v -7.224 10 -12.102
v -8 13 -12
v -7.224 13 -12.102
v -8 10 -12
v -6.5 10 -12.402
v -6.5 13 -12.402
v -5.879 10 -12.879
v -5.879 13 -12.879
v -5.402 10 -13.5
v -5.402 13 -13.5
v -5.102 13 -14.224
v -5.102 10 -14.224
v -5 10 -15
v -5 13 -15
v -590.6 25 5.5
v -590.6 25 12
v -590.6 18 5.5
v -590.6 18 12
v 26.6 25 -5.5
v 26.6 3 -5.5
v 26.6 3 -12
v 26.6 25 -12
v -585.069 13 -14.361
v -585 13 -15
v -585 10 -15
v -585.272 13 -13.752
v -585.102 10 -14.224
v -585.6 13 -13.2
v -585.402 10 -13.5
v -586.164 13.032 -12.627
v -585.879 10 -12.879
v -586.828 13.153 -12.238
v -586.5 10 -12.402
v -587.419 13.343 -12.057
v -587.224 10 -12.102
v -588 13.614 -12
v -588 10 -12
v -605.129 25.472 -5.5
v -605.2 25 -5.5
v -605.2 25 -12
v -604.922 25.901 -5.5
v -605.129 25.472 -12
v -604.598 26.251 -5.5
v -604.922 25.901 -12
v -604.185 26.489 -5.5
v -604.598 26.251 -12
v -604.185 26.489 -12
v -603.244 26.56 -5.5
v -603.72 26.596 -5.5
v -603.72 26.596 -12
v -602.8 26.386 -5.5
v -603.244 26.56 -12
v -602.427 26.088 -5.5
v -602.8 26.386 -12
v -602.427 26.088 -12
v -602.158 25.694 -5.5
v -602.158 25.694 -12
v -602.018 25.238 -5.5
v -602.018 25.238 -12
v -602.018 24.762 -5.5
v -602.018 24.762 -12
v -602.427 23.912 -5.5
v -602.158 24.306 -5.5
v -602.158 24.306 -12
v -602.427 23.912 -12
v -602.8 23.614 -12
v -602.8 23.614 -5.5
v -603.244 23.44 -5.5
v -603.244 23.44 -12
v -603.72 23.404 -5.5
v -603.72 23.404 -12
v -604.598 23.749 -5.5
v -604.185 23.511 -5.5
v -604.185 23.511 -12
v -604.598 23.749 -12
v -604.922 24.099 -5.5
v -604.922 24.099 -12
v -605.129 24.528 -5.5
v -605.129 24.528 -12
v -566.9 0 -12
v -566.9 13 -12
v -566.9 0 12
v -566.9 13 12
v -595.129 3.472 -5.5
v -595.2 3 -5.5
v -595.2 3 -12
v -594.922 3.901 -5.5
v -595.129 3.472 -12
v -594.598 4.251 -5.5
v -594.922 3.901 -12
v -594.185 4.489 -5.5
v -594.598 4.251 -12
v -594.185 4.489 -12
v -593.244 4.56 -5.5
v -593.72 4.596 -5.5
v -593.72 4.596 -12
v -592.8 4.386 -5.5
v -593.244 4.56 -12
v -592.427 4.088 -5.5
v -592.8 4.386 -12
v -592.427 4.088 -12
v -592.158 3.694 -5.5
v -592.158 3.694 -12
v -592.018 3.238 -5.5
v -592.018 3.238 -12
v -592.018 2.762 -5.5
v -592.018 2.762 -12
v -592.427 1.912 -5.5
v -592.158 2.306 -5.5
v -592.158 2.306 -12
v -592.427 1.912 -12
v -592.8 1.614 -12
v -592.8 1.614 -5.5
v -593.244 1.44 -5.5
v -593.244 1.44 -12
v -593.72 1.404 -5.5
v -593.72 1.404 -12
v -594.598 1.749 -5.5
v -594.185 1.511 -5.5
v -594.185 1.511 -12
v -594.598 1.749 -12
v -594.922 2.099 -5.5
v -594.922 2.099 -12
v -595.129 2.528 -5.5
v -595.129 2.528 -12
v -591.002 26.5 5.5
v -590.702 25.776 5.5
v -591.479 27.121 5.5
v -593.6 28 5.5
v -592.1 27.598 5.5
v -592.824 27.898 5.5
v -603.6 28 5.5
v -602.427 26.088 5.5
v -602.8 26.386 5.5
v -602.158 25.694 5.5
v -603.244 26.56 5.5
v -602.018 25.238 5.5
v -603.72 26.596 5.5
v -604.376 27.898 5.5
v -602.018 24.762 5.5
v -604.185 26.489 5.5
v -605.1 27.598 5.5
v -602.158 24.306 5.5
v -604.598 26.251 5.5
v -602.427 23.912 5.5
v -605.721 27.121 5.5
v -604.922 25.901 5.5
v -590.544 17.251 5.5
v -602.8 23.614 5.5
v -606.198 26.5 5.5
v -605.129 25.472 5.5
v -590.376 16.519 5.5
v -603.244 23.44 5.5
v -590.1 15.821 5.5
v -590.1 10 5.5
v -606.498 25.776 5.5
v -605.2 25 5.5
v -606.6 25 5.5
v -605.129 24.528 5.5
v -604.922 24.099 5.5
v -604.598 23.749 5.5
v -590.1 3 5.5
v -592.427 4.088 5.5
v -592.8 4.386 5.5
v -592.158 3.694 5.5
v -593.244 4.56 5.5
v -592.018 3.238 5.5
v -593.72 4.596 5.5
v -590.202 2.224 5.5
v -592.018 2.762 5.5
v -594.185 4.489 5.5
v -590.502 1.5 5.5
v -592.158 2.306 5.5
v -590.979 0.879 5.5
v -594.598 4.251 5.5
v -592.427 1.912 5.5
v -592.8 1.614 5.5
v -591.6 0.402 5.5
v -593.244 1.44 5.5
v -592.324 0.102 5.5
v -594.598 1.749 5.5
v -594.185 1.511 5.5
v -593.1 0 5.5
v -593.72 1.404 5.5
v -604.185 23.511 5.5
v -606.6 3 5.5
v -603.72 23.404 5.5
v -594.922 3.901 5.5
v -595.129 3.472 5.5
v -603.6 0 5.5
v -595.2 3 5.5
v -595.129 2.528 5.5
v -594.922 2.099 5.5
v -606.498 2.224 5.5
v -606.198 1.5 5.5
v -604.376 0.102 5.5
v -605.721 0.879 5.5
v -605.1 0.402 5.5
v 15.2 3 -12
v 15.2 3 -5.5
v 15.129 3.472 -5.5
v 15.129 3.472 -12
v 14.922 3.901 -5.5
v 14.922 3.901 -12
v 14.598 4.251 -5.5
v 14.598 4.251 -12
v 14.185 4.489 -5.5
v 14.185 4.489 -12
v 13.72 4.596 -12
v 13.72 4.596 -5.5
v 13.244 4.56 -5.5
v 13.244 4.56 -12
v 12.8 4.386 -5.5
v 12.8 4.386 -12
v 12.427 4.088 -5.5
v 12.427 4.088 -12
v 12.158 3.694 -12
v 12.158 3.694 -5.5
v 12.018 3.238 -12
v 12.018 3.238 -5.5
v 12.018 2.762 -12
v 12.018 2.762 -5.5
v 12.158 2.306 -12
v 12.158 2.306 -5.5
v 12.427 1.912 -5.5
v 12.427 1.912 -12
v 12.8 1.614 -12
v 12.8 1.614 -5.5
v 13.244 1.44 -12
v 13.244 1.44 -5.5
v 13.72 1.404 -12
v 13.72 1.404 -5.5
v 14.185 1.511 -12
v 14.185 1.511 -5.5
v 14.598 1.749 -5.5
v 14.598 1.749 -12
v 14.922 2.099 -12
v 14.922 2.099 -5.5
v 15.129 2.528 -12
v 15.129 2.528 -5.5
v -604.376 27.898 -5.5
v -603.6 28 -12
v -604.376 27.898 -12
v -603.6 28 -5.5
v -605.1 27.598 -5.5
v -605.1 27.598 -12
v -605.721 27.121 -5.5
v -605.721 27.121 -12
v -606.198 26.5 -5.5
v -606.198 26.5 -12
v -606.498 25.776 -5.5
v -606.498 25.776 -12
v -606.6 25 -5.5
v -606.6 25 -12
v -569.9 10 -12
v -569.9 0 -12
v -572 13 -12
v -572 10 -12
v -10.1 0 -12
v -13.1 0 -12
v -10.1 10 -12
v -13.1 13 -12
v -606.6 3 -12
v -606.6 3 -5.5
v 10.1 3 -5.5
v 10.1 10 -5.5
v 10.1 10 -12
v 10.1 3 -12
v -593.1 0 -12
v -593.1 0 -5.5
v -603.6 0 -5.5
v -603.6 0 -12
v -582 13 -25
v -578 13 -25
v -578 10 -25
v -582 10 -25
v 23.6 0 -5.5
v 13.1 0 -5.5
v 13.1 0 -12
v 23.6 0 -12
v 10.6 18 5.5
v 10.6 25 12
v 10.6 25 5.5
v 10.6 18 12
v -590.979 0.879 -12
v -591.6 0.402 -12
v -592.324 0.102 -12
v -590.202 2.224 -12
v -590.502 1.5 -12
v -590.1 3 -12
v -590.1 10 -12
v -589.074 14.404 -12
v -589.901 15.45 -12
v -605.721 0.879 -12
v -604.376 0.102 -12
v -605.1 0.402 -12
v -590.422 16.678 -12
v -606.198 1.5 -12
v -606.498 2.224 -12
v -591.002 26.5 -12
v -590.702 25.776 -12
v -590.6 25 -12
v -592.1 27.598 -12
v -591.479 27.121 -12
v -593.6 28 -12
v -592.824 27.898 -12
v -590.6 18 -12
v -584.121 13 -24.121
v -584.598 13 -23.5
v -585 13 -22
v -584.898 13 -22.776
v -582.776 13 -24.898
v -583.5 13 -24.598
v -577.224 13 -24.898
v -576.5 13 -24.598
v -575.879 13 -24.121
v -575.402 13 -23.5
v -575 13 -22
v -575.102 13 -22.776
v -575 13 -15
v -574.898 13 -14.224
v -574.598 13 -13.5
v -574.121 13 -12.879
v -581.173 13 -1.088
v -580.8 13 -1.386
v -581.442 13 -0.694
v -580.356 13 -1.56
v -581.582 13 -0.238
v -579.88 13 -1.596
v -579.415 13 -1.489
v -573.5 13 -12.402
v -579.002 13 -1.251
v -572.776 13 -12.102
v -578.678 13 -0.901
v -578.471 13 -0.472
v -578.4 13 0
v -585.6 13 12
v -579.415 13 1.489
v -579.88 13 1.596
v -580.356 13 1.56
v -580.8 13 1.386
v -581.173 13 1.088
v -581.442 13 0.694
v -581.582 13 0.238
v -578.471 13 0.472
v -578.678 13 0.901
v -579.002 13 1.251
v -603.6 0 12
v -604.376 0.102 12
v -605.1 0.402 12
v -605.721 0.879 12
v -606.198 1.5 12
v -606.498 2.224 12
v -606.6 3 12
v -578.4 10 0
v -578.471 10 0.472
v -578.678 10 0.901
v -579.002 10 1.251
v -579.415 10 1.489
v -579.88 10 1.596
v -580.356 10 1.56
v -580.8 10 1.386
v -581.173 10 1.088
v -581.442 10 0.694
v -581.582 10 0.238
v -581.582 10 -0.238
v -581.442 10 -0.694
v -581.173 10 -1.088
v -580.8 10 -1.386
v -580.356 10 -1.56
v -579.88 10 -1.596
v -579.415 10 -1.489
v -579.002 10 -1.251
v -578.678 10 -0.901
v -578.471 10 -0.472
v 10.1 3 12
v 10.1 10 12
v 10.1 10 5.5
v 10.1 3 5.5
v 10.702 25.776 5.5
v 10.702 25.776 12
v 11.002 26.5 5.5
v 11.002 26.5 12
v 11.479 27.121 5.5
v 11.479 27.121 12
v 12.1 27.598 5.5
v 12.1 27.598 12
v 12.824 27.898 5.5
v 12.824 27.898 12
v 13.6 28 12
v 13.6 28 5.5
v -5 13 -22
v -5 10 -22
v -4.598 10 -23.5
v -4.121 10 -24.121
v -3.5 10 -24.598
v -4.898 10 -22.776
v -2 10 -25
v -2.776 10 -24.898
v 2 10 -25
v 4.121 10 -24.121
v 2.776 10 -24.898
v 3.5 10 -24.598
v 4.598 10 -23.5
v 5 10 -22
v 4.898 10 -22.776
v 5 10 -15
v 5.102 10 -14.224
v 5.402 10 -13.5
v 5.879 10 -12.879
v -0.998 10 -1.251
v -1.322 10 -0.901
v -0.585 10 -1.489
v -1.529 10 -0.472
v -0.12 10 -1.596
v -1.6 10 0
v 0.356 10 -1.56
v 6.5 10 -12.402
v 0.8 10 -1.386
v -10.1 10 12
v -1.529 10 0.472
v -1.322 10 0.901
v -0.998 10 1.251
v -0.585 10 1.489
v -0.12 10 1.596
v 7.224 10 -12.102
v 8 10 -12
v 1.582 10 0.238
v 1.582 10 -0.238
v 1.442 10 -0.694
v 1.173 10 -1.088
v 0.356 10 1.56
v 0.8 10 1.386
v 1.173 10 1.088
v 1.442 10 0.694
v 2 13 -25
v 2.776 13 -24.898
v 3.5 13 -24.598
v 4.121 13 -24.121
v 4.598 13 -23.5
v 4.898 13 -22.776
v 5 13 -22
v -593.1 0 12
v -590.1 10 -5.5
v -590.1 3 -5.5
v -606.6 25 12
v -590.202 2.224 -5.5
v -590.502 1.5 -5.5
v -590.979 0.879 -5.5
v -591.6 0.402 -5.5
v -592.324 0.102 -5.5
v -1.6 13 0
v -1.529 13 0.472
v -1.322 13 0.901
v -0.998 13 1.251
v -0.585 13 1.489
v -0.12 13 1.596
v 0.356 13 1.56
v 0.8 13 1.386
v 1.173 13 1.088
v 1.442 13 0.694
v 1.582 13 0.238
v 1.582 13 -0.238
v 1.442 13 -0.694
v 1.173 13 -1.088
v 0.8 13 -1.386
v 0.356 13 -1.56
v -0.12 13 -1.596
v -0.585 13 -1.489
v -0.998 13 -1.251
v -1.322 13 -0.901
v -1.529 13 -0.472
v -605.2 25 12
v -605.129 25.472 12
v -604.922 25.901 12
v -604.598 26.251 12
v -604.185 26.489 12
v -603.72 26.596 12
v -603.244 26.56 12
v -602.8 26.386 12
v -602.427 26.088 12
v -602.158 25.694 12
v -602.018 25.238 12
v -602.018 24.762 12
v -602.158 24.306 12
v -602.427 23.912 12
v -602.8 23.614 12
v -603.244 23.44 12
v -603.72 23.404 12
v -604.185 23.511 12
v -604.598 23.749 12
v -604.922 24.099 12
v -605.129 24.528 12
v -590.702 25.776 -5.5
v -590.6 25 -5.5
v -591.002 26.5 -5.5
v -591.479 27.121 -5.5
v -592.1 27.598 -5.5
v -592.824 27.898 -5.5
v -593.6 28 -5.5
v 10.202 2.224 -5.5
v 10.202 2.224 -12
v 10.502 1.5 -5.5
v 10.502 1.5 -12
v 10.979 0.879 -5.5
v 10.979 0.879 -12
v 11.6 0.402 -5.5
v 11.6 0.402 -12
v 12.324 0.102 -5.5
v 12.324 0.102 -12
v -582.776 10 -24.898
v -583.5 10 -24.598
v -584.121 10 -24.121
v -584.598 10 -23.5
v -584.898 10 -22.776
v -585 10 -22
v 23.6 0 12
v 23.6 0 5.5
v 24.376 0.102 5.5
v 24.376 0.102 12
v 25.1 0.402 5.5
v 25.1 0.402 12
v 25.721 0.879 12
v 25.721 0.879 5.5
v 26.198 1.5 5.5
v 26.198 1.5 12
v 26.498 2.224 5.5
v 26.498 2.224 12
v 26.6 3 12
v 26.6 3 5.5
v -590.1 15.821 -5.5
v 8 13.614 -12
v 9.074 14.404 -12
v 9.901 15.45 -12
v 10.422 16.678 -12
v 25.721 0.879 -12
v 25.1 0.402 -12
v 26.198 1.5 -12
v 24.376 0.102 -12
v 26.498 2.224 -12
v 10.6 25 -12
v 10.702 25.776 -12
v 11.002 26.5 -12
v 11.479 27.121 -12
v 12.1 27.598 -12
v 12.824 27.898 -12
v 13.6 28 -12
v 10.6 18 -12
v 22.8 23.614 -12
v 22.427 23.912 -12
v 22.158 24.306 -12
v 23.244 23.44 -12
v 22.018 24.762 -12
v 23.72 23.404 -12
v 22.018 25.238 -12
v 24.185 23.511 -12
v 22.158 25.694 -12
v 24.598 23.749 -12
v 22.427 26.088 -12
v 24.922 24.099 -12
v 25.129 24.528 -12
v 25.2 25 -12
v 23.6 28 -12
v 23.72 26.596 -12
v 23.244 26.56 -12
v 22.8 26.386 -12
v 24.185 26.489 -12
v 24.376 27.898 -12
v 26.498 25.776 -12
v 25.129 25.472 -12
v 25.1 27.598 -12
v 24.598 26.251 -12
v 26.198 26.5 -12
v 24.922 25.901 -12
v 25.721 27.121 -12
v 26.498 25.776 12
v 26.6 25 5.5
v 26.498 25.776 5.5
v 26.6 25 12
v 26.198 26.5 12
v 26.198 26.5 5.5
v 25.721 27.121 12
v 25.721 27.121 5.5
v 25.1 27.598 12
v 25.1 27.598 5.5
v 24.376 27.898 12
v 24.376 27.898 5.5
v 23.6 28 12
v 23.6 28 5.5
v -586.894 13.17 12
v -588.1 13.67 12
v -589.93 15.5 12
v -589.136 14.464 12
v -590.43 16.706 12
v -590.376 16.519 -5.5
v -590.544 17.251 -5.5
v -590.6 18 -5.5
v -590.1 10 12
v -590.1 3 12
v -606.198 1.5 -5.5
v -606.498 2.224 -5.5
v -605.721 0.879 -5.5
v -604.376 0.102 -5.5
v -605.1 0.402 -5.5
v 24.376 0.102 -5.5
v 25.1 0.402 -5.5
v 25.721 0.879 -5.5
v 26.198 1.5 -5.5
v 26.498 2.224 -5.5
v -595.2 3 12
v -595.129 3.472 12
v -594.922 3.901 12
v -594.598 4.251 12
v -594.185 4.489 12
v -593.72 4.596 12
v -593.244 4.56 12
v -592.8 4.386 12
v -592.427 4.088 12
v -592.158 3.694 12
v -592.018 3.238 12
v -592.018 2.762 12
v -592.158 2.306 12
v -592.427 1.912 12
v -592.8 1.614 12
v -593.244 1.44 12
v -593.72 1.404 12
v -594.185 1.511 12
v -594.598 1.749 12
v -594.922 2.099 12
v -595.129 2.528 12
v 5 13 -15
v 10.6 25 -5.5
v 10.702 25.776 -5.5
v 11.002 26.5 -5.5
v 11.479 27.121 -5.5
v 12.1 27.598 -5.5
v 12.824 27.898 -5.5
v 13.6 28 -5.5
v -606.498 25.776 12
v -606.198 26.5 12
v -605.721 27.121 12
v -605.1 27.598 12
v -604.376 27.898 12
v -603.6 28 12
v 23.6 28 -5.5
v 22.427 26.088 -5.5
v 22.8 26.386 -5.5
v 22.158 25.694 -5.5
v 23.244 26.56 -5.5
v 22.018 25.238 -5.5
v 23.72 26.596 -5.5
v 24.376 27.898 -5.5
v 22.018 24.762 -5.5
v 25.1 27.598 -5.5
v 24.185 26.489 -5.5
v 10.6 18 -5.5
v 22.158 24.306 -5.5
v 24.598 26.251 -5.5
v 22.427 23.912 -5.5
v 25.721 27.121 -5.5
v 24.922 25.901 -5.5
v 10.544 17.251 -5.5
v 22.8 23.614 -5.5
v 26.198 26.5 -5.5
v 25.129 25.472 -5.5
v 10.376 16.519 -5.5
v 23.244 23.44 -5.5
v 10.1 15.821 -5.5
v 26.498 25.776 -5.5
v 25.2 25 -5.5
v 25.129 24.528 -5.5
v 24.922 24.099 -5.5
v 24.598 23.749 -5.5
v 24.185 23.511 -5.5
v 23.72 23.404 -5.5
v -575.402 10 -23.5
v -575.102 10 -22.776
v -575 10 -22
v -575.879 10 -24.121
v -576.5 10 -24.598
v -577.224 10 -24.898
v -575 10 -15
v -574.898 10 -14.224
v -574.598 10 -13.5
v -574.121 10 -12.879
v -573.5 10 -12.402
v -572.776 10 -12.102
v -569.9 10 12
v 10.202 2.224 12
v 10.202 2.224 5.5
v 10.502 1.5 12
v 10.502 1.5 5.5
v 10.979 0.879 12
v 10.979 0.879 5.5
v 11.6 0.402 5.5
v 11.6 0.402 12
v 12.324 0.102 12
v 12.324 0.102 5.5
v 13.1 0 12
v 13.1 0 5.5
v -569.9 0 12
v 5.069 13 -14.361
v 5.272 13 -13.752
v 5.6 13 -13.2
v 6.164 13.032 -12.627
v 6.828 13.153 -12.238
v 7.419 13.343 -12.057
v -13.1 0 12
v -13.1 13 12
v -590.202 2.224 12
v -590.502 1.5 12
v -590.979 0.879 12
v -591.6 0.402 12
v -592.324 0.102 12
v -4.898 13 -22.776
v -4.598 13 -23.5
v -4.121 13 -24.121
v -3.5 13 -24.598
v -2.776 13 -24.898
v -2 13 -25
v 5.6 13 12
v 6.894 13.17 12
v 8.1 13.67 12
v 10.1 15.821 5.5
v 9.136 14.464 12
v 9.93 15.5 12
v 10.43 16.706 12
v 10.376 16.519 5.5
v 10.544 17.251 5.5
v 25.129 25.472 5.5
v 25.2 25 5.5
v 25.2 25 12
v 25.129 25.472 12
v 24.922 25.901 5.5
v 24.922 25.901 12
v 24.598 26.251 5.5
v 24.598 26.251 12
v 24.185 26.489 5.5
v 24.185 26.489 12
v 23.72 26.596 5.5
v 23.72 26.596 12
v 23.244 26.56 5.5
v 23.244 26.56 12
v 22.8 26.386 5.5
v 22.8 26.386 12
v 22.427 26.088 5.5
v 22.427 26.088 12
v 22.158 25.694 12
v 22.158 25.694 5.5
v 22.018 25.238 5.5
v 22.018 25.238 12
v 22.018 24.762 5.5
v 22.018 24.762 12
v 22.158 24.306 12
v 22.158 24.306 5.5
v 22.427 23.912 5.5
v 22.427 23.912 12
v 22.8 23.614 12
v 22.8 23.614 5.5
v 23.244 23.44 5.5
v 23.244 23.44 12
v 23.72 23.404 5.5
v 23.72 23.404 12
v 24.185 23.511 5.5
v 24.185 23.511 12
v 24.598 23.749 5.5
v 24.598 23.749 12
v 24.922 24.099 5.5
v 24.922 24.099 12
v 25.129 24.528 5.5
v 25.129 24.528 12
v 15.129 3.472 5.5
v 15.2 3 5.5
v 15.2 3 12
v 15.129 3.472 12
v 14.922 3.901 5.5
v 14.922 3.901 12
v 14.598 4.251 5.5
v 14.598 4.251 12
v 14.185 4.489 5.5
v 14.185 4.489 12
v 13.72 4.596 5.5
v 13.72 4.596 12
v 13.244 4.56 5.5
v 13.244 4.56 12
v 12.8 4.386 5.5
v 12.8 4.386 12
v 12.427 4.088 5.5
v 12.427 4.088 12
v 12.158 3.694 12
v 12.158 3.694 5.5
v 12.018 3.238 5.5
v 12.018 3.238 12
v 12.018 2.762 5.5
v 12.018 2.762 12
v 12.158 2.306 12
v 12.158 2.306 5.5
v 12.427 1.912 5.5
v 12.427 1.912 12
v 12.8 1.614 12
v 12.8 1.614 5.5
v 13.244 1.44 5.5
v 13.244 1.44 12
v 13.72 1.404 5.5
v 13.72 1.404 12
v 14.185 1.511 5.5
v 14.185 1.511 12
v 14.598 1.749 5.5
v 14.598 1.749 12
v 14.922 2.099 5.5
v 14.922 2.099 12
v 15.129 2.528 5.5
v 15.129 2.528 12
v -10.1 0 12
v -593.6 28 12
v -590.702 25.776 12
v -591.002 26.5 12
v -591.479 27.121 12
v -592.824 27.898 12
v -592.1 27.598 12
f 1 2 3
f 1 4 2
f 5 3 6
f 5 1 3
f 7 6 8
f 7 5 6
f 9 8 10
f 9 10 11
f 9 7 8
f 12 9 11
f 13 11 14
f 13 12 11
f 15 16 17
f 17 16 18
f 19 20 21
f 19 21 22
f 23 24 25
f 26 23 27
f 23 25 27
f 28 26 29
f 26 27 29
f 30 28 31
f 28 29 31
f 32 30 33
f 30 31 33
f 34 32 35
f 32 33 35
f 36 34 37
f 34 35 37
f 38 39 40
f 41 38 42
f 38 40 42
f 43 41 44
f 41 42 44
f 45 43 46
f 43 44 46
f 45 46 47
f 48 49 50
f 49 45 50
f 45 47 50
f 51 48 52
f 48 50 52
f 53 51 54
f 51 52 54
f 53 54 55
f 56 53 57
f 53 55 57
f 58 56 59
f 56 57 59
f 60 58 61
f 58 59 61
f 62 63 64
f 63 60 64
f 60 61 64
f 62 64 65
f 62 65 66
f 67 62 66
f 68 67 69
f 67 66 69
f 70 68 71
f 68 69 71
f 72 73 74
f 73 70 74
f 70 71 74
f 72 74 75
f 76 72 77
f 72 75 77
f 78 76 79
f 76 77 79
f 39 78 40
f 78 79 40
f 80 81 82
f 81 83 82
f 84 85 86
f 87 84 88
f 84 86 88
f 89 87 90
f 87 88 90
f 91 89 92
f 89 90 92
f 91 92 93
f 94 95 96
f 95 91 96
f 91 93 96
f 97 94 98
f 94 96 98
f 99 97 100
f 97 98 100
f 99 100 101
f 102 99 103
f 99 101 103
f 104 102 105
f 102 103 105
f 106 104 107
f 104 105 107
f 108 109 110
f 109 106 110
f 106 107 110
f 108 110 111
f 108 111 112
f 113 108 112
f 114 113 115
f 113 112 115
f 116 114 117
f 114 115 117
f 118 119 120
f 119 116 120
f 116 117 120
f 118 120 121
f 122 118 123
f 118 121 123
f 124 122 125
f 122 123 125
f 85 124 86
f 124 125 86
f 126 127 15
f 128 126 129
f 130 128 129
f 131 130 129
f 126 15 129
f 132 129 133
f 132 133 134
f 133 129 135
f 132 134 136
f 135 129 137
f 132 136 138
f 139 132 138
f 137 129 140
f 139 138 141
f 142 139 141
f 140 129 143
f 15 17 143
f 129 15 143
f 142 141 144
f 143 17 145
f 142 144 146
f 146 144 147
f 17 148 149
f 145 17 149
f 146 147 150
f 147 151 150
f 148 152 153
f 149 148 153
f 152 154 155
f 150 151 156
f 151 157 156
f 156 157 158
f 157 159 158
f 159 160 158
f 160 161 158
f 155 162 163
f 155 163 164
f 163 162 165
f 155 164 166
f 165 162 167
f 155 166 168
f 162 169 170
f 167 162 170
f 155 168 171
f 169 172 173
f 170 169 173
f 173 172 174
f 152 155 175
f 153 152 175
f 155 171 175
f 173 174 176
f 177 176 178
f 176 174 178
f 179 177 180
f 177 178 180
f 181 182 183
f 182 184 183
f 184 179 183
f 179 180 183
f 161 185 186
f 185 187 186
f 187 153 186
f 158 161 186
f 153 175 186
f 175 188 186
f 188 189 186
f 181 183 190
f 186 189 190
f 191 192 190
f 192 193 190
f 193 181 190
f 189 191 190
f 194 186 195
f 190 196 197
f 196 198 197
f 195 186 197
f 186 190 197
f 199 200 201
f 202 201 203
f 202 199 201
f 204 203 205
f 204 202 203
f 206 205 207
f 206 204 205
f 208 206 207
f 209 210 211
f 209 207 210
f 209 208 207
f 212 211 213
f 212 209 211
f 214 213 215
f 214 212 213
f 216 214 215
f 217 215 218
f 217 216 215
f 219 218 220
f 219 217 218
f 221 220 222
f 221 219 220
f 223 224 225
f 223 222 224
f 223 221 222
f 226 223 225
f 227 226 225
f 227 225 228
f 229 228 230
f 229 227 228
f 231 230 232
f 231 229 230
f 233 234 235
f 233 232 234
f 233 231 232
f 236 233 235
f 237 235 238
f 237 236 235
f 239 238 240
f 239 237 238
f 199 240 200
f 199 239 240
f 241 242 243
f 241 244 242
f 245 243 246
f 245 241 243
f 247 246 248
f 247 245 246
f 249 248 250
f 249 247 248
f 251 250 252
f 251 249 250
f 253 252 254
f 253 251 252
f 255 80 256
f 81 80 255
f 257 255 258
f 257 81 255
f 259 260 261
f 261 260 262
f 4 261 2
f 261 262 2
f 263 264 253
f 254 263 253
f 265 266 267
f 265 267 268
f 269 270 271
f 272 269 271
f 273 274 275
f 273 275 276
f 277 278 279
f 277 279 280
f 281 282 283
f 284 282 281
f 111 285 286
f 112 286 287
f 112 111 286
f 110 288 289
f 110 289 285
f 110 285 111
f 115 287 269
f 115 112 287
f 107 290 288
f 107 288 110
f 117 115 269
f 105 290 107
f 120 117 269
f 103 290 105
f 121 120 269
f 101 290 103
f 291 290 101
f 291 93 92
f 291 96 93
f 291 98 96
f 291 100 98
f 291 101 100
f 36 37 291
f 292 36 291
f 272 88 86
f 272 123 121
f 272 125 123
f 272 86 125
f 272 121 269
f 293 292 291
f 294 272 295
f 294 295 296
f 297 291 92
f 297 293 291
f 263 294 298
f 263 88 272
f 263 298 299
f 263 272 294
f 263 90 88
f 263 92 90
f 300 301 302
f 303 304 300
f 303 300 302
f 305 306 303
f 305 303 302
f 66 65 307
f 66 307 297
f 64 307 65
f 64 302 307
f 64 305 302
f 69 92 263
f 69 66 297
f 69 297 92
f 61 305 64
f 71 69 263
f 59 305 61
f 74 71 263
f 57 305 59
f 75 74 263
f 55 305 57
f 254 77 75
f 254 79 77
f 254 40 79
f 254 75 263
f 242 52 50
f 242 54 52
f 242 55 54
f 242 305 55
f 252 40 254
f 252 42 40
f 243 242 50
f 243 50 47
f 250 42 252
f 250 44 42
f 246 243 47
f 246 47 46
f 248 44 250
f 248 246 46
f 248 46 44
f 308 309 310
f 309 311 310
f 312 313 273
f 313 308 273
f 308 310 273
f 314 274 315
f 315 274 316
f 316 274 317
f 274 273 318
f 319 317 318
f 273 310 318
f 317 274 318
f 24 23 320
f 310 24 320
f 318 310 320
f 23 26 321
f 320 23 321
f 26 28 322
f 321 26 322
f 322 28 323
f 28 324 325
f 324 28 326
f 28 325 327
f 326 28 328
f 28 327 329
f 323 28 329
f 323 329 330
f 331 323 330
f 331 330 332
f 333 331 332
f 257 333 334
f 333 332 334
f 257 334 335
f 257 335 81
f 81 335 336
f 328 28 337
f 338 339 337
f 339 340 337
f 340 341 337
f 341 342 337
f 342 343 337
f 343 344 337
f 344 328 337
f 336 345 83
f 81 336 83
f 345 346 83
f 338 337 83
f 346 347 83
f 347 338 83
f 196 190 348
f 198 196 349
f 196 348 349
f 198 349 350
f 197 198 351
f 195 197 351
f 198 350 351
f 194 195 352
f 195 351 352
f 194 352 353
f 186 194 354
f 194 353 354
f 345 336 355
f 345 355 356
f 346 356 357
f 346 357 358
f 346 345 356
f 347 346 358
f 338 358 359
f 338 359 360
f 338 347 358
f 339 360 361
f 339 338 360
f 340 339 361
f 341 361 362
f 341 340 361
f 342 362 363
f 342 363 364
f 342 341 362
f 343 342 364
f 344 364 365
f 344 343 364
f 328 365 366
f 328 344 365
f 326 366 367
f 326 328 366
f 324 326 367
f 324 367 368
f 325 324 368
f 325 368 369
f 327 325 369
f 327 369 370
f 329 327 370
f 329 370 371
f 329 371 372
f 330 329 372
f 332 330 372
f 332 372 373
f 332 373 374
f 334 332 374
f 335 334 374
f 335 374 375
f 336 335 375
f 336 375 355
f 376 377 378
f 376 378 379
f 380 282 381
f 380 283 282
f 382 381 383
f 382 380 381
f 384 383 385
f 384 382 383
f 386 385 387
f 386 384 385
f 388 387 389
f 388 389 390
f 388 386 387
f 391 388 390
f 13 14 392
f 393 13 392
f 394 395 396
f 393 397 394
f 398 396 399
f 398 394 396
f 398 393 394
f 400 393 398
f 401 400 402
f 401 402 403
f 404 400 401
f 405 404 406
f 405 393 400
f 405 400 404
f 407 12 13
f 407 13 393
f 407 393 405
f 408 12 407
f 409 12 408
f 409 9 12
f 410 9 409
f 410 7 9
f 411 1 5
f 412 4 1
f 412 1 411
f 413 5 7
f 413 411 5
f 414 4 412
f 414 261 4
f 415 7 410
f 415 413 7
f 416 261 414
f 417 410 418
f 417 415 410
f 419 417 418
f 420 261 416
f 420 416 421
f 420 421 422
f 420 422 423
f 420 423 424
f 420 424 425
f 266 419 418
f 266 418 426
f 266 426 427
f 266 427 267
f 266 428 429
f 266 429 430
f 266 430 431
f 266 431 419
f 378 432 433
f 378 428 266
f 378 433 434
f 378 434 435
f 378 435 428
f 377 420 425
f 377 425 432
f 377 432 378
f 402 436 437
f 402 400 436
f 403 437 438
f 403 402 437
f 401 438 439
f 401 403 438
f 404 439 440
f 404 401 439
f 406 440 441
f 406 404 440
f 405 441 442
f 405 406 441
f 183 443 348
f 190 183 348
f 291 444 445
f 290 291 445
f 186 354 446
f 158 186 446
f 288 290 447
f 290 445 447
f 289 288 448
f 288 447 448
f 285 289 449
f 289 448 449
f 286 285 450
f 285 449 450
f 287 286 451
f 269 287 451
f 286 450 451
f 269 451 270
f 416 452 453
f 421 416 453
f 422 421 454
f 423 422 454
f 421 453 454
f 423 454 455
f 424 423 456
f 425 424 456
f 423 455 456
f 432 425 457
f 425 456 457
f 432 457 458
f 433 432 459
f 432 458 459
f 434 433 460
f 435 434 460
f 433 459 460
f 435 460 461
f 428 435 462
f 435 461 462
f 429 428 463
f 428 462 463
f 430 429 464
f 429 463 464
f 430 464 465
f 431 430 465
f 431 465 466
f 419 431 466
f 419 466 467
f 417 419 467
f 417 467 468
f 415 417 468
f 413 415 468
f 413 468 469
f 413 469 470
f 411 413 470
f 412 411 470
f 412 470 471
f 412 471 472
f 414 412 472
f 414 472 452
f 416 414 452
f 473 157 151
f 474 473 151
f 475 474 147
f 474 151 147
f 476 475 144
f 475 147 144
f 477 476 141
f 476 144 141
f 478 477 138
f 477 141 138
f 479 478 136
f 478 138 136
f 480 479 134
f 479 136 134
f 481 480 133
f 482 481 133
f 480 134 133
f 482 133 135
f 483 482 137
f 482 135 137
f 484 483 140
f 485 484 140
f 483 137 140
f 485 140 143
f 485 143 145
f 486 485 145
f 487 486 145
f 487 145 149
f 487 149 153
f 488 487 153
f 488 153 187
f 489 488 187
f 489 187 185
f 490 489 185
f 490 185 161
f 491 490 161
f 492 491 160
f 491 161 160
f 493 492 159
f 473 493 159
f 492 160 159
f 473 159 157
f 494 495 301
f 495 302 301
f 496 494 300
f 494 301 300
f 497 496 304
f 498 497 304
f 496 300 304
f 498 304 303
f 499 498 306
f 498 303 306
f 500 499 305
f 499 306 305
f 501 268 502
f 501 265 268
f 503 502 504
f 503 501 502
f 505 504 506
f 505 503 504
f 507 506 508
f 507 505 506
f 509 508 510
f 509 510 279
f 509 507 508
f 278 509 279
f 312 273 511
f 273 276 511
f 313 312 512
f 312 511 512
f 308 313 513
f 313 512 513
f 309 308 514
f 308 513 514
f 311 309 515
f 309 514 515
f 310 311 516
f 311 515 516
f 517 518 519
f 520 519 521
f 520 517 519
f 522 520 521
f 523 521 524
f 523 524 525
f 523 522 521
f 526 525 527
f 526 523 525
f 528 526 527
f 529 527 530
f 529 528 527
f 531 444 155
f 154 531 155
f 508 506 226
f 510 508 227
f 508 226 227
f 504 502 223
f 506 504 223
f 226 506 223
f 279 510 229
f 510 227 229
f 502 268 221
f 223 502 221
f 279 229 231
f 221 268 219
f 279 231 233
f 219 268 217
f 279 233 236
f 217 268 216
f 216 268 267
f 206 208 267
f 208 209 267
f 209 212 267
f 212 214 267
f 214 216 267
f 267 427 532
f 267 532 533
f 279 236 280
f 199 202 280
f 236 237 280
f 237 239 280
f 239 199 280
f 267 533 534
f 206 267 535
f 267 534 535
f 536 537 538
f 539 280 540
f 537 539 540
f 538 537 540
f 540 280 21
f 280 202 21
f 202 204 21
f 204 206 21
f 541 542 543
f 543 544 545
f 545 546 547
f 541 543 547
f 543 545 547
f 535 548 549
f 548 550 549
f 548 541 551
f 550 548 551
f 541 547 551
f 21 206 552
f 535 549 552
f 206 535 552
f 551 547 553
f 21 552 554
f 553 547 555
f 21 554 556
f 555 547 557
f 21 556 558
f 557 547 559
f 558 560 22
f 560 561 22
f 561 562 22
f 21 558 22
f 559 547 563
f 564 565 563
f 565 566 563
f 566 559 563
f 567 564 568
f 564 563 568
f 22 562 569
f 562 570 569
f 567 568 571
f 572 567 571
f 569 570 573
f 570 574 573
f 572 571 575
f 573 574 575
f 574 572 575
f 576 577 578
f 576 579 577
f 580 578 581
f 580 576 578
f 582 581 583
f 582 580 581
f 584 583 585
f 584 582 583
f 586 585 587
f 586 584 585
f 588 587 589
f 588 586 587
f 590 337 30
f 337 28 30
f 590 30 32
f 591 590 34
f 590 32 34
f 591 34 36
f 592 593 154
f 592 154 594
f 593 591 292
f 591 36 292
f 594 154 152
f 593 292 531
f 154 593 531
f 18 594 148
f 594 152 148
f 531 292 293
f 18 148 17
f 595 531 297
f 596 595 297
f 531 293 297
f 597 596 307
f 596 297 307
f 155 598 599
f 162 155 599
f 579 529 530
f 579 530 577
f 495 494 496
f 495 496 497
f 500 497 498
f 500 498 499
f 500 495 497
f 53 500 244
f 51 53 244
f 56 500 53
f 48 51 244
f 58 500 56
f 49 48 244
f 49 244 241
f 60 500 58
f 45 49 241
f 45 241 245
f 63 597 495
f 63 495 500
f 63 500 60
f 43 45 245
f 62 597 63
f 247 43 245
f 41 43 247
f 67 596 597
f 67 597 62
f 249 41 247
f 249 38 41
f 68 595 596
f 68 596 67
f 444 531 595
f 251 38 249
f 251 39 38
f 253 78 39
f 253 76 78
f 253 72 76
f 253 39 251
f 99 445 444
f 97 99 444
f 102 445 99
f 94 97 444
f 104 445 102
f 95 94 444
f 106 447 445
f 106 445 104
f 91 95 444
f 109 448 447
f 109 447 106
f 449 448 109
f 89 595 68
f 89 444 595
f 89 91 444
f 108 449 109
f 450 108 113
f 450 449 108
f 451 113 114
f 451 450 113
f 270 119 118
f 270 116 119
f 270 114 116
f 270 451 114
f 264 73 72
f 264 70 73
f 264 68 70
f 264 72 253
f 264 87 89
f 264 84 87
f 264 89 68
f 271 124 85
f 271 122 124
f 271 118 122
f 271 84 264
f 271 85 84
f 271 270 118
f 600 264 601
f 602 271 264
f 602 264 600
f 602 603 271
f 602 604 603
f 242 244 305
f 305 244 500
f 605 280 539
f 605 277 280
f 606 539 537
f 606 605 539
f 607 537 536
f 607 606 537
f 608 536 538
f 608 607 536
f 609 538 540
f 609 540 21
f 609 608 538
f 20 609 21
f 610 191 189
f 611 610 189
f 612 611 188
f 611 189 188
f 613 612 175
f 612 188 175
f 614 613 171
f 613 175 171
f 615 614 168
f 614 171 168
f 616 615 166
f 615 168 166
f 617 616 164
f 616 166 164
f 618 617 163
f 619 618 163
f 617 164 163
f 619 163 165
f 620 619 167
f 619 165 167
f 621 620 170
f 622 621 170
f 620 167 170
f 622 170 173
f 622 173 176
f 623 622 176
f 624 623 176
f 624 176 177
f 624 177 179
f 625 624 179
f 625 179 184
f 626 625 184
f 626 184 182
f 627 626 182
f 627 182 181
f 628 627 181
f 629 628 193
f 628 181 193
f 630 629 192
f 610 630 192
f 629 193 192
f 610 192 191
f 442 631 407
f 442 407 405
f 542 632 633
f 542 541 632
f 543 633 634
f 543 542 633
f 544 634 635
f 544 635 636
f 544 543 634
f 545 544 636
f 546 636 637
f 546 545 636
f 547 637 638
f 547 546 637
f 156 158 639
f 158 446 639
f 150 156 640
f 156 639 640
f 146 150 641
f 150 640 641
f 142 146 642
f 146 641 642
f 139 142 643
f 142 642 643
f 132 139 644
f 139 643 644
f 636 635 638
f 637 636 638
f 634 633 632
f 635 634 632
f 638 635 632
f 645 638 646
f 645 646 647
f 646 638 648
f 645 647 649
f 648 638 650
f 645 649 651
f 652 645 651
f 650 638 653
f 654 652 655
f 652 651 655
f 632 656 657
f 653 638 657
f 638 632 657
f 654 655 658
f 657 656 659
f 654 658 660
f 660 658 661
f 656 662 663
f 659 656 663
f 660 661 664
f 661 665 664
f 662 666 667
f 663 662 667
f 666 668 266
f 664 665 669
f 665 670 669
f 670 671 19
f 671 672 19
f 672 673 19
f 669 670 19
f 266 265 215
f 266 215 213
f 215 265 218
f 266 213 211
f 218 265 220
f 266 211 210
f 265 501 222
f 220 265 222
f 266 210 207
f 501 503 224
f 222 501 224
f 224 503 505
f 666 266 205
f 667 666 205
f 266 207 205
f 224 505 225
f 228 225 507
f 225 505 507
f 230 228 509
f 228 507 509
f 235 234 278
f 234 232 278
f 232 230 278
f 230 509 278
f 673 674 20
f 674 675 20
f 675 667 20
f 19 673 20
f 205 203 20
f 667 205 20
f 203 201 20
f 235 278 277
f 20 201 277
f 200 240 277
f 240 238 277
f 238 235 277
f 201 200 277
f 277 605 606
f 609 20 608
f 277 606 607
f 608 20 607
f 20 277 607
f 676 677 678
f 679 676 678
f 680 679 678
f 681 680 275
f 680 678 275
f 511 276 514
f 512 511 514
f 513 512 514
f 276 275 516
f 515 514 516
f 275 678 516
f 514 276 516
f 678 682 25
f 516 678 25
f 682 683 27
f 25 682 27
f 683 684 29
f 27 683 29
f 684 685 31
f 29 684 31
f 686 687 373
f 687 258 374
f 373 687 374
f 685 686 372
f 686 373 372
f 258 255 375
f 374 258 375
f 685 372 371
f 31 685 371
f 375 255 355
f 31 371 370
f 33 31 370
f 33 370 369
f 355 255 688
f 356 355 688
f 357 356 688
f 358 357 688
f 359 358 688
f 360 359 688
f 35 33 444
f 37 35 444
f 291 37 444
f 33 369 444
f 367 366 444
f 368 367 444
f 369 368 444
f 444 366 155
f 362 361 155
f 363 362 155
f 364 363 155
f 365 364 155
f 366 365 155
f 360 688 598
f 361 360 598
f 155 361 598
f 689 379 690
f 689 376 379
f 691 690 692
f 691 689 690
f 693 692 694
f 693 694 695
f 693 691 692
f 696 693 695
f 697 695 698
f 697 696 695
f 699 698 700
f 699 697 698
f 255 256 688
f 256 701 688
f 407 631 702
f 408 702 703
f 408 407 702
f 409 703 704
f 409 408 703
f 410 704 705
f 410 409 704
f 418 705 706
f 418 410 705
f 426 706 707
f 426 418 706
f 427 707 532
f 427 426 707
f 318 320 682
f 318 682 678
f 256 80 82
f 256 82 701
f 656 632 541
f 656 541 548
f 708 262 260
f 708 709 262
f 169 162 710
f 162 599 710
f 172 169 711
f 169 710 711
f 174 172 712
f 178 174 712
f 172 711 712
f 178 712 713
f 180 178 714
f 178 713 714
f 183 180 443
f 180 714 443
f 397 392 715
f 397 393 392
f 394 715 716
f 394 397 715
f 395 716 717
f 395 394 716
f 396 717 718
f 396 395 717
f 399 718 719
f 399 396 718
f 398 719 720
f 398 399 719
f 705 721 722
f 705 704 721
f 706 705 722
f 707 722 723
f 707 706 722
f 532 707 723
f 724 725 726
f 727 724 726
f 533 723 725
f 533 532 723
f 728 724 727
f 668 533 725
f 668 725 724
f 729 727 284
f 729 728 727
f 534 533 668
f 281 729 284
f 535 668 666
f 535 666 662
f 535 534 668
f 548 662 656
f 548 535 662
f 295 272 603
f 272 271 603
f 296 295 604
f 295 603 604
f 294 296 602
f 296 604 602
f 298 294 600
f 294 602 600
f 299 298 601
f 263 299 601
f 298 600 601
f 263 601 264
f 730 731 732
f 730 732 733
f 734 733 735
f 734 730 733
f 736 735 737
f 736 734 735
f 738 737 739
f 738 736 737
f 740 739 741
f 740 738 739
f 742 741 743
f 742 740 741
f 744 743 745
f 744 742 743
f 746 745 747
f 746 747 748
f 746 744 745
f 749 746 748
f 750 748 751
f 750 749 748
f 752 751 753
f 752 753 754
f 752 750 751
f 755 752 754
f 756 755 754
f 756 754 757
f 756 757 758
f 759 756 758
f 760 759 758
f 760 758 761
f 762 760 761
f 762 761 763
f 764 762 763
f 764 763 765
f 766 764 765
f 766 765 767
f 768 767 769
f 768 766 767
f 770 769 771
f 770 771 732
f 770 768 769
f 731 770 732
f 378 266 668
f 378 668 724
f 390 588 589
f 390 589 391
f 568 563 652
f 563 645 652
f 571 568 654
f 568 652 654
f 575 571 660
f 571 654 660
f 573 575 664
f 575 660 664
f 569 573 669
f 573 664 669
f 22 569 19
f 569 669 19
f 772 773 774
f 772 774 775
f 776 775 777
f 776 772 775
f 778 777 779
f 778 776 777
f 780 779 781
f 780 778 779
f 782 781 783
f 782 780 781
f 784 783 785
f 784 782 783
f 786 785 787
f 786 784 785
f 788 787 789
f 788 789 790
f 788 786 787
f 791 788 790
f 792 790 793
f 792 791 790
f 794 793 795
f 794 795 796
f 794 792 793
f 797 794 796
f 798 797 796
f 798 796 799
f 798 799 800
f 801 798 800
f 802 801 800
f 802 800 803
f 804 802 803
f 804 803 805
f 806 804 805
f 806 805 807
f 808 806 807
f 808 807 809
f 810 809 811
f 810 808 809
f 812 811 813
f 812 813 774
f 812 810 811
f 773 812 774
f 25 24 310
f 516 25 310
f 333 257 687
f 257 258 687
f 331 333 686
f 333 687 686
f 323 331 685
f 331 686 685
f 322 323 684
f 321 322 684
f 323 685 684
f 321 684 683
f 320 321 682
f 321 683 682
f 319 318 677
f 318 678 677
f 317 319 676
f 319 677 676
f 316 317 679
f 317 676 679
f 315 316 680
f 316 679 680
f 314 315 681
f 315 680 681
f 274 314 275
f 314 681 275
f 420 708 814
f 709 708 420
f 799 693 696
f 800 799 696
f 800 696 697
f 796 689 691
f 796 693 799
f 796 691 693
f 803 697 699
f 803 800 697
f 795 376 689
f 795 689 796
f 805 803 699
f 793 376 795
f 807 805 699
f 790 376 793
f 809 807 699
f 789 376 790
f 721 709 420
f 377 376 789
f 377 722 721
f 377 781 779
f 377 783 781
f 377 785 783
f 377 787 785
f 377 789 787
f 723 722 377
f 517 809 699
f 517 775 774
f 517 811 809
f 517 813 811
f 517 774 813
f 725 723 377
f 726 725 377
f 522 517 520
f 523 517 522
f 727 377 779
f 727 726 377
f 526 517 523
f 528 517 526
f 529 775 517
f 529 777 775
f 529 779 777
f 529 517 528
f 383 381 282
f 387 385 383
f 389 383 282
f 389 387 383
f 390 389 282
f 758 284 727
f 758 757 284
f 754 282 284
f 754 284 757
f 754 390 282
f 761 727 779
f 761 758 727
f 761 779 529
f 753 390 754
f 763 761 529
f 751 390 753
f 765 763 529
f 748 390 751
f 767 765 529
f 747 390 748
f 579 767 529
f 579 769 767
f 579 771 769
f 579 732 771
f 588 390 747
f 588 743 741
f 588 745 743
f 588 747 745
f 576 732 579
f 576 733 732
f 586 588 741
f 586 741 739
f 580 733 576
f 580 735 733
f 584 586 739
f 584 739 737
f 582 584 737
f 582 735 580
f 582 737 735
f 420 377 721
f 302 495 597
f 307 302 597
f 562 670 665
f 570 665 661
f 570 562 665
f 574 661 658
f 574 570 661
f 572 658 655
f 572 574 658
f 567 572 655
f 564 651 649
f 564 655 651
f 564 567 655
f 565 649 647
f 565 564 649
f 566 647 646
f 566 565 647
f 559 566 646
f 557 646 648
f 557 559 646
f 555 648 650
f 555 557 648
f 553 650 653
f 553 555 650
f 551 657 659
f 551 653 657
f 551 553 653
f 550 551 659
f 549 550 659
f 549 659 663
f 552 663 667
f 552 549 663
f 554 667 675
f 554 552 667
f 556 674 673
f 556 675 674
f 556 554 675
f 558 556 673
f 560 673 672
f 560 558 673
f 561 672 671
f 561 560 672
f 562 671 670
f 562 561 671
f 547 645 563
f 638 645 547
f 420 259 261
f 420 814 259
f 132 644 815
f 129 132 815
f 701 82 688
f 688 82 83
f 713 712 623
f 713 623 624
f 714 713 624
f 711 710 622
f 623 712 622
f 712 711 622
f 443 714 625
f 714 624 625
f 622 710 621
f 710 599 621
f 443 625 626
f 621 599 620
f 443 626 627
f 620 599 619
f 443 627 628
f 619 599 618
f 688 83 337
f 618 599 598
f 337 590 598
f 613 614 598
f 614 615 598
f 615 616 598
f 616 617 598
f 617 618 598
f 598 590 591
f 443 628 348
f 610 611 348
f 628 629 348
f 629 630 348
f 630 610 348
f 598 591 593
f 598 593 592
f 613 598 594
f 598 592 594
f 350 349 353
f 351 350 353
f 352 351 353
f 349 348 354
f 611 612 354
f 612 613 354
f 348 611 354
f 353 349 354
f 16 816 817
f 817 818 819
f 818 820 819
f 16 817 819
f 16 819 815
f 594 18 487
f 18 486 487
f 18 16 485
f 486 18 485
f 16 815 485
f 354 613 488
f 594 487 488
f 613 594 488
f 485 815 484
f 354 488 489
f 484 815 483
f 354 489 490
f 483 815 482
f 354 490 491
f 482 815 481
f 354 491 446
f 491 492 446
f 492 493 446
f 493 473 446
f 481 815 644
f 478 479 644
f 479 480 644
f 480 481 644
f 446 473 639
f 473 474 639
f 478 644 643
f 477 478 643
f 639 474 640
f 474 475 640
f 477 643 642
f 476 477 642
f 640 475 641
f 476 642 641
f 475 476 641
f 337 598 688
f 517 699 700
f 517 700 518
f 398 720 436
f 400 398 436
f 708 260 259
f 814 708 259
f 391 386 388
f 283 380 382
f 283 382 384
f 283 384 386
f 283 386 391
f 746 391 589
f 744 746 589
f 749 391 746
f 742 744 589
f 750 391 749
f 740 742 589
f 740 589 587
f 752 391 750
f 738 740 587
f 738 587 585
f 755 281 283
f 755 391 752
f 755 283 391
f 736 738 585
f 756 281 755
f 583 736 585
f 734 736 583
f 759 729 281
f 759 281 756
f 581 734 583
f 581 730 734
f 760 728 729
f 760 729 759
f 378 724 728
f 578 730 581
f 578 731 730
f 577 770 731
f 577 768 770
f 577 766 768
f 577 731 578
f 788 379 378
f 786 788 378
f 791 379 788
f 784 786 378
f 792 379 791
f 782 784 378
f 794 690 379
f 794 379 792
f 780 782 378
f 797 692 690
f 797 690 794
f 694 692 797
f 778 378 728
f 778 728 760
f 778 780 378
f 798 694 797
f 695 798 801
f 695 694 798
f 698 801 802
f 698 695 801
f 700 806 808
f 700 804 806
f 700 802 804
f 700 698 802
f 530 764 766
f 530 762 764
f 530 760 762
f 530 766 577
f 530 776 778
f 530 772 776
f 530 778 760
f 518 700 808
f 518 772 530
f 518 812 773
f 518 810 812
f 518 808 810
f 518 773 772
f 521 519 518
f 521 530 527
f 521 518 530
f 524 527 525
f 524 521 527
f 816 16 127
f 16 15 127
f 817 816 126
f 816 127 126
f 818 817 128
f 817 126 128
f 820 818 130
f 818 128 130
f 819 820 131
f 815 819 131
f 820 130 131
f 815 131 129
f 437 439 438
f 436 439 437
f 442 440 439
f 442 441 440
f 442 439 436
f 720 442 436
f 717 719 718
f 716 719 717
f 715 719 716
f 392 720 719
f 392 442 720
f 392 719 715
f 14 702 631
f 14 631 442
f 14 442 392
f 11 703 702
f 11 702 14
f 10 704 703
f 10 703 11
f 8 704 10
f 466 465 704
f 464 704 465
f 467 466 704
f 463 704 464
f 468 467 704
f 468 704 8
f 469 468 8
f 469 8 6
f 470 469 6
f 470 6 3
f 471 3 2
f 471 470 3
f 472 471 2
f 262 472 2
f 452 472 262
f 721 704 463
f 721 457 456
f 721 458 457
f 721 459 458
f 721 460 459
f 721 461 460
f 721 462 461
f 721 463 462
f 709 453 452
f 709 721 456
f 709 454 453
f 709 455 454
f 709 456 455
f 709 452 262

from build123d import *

# Parameters (mm, degrees)
SKETCH_1_R          = 1.6
EXTRUDE_1_DEPTH     = 12
SKETCH_2_W          = 16.5
SKETCH_2_H          = 11
CUT_EXTRUDE_1_DEPTH = 41.442057317
SKETCH_3_W          = 10
SKETCH_3_H          = 13
EXTRUDE_2_DEPTH     = 3
SKETCH_4_R          = 1.6
CUT_EXTRUDE_2_DEPTH = 40.465934678
FILLET_1_R          = 3
FILLET_2_R          = 5


with BuildPart() as part:
    # 草图1 → 凸台-拉伸1 (new, symmetric)
    with BuildSketch(Plane.XY):
        Polygon((-10.1, 0), (-10.1, 10), (10.1, 10), (10.1, 0), (13.1, 0), (26.6, 0), (26.6, 28), (10.6, 28), (10.6, 13), (-13.1, 13), (-13.1, 0), align=None)
        with Locations((23.6, 25)):
            Circle(SKETCH_1_R, mode=Mode.SUBTRACT)
        with Locations((13.6, 3)):
            Circle(SKETCH_1_R, mode=Mode.SUBTRACT)
    extrude(amount=EXTRUDE_1_DEPTH, both=True)

    # 草图2 → 切除-拉伸1 (cut, through all)
    with BuildSketch(Plane.XZ):
        with Locations((18.35, 0)):
            Rectangle(SKETCH_2_W, SKETCH_2_H)
    extrude(amount=-CUT_EXTRUDE_1_DEPTH, mode=Mode.SUBTRACT)

    # 草图3 → 凸台-拉伸2 (add)
    with BuildSketch(Plane(origin=(0, 13, 0), x_dir=(1, 0, 0), z_dir=(0, 1, 0))):
        with Locations((0, 18.5)):
            Rectangle(SKETCH_3_W, SKETCH_3_H)
    extrude(amount=-EXTRUDE_2_DEPTH)

    # 草图4 → 切除-拉伸2 (cut, through all)
    with BuildSketch(Plane(origin=(0, 13, 0), x_dir=(1, 0, 0), z_dir=(0, 1, 0))):
        with Locations(Location((0, 0, 0), (0, 0, 180))):
            Circle(SKETCH_4_R)
    extrude(amount=-CUT_EXTRUDE_2_DEPTH, mode=Mode.SUBTRACT)

    # 圆角1
    fillet_1_edges = [part.edges().sort_by_distance(p)[0] for p in [
        (10.6, 28, 8.75),
        (26.6, 28, 8.75),
        (26.6, 0, 8.75),
        (10.1, 0, 8.75),
        (10.6, 28, -8.75),
        (26.6, 28, -8.75),
        (26.6, 0, -8.75),
        (10.1, 0, -8.75),
        (5, 11.5, -25),
        (5, 11.5, -12),
        (-5, 11.5, -12),
        (-5, 11.5, -25),
    ]]
    fillet(fillet_1_edges, radius=FILLET_1_R)

    # 圆角2
    fillet_2_edges = [part.edges().sort_by_distance(p)[0] for p in [
        (10.6, 13, -8.75),
    ]]
    fillet(fillet_2_edges, radius=FILLET_2_R)


with BuildPart() as body_2:
    # 镜向1: mirrored copy
    add(part.part.mirror(Plane(origin=(-290, 0, 0), x_dir=(0, 0, 1), z_dir=(1, 0, 0))))


solid = Compound([part.part, body_2.part])
